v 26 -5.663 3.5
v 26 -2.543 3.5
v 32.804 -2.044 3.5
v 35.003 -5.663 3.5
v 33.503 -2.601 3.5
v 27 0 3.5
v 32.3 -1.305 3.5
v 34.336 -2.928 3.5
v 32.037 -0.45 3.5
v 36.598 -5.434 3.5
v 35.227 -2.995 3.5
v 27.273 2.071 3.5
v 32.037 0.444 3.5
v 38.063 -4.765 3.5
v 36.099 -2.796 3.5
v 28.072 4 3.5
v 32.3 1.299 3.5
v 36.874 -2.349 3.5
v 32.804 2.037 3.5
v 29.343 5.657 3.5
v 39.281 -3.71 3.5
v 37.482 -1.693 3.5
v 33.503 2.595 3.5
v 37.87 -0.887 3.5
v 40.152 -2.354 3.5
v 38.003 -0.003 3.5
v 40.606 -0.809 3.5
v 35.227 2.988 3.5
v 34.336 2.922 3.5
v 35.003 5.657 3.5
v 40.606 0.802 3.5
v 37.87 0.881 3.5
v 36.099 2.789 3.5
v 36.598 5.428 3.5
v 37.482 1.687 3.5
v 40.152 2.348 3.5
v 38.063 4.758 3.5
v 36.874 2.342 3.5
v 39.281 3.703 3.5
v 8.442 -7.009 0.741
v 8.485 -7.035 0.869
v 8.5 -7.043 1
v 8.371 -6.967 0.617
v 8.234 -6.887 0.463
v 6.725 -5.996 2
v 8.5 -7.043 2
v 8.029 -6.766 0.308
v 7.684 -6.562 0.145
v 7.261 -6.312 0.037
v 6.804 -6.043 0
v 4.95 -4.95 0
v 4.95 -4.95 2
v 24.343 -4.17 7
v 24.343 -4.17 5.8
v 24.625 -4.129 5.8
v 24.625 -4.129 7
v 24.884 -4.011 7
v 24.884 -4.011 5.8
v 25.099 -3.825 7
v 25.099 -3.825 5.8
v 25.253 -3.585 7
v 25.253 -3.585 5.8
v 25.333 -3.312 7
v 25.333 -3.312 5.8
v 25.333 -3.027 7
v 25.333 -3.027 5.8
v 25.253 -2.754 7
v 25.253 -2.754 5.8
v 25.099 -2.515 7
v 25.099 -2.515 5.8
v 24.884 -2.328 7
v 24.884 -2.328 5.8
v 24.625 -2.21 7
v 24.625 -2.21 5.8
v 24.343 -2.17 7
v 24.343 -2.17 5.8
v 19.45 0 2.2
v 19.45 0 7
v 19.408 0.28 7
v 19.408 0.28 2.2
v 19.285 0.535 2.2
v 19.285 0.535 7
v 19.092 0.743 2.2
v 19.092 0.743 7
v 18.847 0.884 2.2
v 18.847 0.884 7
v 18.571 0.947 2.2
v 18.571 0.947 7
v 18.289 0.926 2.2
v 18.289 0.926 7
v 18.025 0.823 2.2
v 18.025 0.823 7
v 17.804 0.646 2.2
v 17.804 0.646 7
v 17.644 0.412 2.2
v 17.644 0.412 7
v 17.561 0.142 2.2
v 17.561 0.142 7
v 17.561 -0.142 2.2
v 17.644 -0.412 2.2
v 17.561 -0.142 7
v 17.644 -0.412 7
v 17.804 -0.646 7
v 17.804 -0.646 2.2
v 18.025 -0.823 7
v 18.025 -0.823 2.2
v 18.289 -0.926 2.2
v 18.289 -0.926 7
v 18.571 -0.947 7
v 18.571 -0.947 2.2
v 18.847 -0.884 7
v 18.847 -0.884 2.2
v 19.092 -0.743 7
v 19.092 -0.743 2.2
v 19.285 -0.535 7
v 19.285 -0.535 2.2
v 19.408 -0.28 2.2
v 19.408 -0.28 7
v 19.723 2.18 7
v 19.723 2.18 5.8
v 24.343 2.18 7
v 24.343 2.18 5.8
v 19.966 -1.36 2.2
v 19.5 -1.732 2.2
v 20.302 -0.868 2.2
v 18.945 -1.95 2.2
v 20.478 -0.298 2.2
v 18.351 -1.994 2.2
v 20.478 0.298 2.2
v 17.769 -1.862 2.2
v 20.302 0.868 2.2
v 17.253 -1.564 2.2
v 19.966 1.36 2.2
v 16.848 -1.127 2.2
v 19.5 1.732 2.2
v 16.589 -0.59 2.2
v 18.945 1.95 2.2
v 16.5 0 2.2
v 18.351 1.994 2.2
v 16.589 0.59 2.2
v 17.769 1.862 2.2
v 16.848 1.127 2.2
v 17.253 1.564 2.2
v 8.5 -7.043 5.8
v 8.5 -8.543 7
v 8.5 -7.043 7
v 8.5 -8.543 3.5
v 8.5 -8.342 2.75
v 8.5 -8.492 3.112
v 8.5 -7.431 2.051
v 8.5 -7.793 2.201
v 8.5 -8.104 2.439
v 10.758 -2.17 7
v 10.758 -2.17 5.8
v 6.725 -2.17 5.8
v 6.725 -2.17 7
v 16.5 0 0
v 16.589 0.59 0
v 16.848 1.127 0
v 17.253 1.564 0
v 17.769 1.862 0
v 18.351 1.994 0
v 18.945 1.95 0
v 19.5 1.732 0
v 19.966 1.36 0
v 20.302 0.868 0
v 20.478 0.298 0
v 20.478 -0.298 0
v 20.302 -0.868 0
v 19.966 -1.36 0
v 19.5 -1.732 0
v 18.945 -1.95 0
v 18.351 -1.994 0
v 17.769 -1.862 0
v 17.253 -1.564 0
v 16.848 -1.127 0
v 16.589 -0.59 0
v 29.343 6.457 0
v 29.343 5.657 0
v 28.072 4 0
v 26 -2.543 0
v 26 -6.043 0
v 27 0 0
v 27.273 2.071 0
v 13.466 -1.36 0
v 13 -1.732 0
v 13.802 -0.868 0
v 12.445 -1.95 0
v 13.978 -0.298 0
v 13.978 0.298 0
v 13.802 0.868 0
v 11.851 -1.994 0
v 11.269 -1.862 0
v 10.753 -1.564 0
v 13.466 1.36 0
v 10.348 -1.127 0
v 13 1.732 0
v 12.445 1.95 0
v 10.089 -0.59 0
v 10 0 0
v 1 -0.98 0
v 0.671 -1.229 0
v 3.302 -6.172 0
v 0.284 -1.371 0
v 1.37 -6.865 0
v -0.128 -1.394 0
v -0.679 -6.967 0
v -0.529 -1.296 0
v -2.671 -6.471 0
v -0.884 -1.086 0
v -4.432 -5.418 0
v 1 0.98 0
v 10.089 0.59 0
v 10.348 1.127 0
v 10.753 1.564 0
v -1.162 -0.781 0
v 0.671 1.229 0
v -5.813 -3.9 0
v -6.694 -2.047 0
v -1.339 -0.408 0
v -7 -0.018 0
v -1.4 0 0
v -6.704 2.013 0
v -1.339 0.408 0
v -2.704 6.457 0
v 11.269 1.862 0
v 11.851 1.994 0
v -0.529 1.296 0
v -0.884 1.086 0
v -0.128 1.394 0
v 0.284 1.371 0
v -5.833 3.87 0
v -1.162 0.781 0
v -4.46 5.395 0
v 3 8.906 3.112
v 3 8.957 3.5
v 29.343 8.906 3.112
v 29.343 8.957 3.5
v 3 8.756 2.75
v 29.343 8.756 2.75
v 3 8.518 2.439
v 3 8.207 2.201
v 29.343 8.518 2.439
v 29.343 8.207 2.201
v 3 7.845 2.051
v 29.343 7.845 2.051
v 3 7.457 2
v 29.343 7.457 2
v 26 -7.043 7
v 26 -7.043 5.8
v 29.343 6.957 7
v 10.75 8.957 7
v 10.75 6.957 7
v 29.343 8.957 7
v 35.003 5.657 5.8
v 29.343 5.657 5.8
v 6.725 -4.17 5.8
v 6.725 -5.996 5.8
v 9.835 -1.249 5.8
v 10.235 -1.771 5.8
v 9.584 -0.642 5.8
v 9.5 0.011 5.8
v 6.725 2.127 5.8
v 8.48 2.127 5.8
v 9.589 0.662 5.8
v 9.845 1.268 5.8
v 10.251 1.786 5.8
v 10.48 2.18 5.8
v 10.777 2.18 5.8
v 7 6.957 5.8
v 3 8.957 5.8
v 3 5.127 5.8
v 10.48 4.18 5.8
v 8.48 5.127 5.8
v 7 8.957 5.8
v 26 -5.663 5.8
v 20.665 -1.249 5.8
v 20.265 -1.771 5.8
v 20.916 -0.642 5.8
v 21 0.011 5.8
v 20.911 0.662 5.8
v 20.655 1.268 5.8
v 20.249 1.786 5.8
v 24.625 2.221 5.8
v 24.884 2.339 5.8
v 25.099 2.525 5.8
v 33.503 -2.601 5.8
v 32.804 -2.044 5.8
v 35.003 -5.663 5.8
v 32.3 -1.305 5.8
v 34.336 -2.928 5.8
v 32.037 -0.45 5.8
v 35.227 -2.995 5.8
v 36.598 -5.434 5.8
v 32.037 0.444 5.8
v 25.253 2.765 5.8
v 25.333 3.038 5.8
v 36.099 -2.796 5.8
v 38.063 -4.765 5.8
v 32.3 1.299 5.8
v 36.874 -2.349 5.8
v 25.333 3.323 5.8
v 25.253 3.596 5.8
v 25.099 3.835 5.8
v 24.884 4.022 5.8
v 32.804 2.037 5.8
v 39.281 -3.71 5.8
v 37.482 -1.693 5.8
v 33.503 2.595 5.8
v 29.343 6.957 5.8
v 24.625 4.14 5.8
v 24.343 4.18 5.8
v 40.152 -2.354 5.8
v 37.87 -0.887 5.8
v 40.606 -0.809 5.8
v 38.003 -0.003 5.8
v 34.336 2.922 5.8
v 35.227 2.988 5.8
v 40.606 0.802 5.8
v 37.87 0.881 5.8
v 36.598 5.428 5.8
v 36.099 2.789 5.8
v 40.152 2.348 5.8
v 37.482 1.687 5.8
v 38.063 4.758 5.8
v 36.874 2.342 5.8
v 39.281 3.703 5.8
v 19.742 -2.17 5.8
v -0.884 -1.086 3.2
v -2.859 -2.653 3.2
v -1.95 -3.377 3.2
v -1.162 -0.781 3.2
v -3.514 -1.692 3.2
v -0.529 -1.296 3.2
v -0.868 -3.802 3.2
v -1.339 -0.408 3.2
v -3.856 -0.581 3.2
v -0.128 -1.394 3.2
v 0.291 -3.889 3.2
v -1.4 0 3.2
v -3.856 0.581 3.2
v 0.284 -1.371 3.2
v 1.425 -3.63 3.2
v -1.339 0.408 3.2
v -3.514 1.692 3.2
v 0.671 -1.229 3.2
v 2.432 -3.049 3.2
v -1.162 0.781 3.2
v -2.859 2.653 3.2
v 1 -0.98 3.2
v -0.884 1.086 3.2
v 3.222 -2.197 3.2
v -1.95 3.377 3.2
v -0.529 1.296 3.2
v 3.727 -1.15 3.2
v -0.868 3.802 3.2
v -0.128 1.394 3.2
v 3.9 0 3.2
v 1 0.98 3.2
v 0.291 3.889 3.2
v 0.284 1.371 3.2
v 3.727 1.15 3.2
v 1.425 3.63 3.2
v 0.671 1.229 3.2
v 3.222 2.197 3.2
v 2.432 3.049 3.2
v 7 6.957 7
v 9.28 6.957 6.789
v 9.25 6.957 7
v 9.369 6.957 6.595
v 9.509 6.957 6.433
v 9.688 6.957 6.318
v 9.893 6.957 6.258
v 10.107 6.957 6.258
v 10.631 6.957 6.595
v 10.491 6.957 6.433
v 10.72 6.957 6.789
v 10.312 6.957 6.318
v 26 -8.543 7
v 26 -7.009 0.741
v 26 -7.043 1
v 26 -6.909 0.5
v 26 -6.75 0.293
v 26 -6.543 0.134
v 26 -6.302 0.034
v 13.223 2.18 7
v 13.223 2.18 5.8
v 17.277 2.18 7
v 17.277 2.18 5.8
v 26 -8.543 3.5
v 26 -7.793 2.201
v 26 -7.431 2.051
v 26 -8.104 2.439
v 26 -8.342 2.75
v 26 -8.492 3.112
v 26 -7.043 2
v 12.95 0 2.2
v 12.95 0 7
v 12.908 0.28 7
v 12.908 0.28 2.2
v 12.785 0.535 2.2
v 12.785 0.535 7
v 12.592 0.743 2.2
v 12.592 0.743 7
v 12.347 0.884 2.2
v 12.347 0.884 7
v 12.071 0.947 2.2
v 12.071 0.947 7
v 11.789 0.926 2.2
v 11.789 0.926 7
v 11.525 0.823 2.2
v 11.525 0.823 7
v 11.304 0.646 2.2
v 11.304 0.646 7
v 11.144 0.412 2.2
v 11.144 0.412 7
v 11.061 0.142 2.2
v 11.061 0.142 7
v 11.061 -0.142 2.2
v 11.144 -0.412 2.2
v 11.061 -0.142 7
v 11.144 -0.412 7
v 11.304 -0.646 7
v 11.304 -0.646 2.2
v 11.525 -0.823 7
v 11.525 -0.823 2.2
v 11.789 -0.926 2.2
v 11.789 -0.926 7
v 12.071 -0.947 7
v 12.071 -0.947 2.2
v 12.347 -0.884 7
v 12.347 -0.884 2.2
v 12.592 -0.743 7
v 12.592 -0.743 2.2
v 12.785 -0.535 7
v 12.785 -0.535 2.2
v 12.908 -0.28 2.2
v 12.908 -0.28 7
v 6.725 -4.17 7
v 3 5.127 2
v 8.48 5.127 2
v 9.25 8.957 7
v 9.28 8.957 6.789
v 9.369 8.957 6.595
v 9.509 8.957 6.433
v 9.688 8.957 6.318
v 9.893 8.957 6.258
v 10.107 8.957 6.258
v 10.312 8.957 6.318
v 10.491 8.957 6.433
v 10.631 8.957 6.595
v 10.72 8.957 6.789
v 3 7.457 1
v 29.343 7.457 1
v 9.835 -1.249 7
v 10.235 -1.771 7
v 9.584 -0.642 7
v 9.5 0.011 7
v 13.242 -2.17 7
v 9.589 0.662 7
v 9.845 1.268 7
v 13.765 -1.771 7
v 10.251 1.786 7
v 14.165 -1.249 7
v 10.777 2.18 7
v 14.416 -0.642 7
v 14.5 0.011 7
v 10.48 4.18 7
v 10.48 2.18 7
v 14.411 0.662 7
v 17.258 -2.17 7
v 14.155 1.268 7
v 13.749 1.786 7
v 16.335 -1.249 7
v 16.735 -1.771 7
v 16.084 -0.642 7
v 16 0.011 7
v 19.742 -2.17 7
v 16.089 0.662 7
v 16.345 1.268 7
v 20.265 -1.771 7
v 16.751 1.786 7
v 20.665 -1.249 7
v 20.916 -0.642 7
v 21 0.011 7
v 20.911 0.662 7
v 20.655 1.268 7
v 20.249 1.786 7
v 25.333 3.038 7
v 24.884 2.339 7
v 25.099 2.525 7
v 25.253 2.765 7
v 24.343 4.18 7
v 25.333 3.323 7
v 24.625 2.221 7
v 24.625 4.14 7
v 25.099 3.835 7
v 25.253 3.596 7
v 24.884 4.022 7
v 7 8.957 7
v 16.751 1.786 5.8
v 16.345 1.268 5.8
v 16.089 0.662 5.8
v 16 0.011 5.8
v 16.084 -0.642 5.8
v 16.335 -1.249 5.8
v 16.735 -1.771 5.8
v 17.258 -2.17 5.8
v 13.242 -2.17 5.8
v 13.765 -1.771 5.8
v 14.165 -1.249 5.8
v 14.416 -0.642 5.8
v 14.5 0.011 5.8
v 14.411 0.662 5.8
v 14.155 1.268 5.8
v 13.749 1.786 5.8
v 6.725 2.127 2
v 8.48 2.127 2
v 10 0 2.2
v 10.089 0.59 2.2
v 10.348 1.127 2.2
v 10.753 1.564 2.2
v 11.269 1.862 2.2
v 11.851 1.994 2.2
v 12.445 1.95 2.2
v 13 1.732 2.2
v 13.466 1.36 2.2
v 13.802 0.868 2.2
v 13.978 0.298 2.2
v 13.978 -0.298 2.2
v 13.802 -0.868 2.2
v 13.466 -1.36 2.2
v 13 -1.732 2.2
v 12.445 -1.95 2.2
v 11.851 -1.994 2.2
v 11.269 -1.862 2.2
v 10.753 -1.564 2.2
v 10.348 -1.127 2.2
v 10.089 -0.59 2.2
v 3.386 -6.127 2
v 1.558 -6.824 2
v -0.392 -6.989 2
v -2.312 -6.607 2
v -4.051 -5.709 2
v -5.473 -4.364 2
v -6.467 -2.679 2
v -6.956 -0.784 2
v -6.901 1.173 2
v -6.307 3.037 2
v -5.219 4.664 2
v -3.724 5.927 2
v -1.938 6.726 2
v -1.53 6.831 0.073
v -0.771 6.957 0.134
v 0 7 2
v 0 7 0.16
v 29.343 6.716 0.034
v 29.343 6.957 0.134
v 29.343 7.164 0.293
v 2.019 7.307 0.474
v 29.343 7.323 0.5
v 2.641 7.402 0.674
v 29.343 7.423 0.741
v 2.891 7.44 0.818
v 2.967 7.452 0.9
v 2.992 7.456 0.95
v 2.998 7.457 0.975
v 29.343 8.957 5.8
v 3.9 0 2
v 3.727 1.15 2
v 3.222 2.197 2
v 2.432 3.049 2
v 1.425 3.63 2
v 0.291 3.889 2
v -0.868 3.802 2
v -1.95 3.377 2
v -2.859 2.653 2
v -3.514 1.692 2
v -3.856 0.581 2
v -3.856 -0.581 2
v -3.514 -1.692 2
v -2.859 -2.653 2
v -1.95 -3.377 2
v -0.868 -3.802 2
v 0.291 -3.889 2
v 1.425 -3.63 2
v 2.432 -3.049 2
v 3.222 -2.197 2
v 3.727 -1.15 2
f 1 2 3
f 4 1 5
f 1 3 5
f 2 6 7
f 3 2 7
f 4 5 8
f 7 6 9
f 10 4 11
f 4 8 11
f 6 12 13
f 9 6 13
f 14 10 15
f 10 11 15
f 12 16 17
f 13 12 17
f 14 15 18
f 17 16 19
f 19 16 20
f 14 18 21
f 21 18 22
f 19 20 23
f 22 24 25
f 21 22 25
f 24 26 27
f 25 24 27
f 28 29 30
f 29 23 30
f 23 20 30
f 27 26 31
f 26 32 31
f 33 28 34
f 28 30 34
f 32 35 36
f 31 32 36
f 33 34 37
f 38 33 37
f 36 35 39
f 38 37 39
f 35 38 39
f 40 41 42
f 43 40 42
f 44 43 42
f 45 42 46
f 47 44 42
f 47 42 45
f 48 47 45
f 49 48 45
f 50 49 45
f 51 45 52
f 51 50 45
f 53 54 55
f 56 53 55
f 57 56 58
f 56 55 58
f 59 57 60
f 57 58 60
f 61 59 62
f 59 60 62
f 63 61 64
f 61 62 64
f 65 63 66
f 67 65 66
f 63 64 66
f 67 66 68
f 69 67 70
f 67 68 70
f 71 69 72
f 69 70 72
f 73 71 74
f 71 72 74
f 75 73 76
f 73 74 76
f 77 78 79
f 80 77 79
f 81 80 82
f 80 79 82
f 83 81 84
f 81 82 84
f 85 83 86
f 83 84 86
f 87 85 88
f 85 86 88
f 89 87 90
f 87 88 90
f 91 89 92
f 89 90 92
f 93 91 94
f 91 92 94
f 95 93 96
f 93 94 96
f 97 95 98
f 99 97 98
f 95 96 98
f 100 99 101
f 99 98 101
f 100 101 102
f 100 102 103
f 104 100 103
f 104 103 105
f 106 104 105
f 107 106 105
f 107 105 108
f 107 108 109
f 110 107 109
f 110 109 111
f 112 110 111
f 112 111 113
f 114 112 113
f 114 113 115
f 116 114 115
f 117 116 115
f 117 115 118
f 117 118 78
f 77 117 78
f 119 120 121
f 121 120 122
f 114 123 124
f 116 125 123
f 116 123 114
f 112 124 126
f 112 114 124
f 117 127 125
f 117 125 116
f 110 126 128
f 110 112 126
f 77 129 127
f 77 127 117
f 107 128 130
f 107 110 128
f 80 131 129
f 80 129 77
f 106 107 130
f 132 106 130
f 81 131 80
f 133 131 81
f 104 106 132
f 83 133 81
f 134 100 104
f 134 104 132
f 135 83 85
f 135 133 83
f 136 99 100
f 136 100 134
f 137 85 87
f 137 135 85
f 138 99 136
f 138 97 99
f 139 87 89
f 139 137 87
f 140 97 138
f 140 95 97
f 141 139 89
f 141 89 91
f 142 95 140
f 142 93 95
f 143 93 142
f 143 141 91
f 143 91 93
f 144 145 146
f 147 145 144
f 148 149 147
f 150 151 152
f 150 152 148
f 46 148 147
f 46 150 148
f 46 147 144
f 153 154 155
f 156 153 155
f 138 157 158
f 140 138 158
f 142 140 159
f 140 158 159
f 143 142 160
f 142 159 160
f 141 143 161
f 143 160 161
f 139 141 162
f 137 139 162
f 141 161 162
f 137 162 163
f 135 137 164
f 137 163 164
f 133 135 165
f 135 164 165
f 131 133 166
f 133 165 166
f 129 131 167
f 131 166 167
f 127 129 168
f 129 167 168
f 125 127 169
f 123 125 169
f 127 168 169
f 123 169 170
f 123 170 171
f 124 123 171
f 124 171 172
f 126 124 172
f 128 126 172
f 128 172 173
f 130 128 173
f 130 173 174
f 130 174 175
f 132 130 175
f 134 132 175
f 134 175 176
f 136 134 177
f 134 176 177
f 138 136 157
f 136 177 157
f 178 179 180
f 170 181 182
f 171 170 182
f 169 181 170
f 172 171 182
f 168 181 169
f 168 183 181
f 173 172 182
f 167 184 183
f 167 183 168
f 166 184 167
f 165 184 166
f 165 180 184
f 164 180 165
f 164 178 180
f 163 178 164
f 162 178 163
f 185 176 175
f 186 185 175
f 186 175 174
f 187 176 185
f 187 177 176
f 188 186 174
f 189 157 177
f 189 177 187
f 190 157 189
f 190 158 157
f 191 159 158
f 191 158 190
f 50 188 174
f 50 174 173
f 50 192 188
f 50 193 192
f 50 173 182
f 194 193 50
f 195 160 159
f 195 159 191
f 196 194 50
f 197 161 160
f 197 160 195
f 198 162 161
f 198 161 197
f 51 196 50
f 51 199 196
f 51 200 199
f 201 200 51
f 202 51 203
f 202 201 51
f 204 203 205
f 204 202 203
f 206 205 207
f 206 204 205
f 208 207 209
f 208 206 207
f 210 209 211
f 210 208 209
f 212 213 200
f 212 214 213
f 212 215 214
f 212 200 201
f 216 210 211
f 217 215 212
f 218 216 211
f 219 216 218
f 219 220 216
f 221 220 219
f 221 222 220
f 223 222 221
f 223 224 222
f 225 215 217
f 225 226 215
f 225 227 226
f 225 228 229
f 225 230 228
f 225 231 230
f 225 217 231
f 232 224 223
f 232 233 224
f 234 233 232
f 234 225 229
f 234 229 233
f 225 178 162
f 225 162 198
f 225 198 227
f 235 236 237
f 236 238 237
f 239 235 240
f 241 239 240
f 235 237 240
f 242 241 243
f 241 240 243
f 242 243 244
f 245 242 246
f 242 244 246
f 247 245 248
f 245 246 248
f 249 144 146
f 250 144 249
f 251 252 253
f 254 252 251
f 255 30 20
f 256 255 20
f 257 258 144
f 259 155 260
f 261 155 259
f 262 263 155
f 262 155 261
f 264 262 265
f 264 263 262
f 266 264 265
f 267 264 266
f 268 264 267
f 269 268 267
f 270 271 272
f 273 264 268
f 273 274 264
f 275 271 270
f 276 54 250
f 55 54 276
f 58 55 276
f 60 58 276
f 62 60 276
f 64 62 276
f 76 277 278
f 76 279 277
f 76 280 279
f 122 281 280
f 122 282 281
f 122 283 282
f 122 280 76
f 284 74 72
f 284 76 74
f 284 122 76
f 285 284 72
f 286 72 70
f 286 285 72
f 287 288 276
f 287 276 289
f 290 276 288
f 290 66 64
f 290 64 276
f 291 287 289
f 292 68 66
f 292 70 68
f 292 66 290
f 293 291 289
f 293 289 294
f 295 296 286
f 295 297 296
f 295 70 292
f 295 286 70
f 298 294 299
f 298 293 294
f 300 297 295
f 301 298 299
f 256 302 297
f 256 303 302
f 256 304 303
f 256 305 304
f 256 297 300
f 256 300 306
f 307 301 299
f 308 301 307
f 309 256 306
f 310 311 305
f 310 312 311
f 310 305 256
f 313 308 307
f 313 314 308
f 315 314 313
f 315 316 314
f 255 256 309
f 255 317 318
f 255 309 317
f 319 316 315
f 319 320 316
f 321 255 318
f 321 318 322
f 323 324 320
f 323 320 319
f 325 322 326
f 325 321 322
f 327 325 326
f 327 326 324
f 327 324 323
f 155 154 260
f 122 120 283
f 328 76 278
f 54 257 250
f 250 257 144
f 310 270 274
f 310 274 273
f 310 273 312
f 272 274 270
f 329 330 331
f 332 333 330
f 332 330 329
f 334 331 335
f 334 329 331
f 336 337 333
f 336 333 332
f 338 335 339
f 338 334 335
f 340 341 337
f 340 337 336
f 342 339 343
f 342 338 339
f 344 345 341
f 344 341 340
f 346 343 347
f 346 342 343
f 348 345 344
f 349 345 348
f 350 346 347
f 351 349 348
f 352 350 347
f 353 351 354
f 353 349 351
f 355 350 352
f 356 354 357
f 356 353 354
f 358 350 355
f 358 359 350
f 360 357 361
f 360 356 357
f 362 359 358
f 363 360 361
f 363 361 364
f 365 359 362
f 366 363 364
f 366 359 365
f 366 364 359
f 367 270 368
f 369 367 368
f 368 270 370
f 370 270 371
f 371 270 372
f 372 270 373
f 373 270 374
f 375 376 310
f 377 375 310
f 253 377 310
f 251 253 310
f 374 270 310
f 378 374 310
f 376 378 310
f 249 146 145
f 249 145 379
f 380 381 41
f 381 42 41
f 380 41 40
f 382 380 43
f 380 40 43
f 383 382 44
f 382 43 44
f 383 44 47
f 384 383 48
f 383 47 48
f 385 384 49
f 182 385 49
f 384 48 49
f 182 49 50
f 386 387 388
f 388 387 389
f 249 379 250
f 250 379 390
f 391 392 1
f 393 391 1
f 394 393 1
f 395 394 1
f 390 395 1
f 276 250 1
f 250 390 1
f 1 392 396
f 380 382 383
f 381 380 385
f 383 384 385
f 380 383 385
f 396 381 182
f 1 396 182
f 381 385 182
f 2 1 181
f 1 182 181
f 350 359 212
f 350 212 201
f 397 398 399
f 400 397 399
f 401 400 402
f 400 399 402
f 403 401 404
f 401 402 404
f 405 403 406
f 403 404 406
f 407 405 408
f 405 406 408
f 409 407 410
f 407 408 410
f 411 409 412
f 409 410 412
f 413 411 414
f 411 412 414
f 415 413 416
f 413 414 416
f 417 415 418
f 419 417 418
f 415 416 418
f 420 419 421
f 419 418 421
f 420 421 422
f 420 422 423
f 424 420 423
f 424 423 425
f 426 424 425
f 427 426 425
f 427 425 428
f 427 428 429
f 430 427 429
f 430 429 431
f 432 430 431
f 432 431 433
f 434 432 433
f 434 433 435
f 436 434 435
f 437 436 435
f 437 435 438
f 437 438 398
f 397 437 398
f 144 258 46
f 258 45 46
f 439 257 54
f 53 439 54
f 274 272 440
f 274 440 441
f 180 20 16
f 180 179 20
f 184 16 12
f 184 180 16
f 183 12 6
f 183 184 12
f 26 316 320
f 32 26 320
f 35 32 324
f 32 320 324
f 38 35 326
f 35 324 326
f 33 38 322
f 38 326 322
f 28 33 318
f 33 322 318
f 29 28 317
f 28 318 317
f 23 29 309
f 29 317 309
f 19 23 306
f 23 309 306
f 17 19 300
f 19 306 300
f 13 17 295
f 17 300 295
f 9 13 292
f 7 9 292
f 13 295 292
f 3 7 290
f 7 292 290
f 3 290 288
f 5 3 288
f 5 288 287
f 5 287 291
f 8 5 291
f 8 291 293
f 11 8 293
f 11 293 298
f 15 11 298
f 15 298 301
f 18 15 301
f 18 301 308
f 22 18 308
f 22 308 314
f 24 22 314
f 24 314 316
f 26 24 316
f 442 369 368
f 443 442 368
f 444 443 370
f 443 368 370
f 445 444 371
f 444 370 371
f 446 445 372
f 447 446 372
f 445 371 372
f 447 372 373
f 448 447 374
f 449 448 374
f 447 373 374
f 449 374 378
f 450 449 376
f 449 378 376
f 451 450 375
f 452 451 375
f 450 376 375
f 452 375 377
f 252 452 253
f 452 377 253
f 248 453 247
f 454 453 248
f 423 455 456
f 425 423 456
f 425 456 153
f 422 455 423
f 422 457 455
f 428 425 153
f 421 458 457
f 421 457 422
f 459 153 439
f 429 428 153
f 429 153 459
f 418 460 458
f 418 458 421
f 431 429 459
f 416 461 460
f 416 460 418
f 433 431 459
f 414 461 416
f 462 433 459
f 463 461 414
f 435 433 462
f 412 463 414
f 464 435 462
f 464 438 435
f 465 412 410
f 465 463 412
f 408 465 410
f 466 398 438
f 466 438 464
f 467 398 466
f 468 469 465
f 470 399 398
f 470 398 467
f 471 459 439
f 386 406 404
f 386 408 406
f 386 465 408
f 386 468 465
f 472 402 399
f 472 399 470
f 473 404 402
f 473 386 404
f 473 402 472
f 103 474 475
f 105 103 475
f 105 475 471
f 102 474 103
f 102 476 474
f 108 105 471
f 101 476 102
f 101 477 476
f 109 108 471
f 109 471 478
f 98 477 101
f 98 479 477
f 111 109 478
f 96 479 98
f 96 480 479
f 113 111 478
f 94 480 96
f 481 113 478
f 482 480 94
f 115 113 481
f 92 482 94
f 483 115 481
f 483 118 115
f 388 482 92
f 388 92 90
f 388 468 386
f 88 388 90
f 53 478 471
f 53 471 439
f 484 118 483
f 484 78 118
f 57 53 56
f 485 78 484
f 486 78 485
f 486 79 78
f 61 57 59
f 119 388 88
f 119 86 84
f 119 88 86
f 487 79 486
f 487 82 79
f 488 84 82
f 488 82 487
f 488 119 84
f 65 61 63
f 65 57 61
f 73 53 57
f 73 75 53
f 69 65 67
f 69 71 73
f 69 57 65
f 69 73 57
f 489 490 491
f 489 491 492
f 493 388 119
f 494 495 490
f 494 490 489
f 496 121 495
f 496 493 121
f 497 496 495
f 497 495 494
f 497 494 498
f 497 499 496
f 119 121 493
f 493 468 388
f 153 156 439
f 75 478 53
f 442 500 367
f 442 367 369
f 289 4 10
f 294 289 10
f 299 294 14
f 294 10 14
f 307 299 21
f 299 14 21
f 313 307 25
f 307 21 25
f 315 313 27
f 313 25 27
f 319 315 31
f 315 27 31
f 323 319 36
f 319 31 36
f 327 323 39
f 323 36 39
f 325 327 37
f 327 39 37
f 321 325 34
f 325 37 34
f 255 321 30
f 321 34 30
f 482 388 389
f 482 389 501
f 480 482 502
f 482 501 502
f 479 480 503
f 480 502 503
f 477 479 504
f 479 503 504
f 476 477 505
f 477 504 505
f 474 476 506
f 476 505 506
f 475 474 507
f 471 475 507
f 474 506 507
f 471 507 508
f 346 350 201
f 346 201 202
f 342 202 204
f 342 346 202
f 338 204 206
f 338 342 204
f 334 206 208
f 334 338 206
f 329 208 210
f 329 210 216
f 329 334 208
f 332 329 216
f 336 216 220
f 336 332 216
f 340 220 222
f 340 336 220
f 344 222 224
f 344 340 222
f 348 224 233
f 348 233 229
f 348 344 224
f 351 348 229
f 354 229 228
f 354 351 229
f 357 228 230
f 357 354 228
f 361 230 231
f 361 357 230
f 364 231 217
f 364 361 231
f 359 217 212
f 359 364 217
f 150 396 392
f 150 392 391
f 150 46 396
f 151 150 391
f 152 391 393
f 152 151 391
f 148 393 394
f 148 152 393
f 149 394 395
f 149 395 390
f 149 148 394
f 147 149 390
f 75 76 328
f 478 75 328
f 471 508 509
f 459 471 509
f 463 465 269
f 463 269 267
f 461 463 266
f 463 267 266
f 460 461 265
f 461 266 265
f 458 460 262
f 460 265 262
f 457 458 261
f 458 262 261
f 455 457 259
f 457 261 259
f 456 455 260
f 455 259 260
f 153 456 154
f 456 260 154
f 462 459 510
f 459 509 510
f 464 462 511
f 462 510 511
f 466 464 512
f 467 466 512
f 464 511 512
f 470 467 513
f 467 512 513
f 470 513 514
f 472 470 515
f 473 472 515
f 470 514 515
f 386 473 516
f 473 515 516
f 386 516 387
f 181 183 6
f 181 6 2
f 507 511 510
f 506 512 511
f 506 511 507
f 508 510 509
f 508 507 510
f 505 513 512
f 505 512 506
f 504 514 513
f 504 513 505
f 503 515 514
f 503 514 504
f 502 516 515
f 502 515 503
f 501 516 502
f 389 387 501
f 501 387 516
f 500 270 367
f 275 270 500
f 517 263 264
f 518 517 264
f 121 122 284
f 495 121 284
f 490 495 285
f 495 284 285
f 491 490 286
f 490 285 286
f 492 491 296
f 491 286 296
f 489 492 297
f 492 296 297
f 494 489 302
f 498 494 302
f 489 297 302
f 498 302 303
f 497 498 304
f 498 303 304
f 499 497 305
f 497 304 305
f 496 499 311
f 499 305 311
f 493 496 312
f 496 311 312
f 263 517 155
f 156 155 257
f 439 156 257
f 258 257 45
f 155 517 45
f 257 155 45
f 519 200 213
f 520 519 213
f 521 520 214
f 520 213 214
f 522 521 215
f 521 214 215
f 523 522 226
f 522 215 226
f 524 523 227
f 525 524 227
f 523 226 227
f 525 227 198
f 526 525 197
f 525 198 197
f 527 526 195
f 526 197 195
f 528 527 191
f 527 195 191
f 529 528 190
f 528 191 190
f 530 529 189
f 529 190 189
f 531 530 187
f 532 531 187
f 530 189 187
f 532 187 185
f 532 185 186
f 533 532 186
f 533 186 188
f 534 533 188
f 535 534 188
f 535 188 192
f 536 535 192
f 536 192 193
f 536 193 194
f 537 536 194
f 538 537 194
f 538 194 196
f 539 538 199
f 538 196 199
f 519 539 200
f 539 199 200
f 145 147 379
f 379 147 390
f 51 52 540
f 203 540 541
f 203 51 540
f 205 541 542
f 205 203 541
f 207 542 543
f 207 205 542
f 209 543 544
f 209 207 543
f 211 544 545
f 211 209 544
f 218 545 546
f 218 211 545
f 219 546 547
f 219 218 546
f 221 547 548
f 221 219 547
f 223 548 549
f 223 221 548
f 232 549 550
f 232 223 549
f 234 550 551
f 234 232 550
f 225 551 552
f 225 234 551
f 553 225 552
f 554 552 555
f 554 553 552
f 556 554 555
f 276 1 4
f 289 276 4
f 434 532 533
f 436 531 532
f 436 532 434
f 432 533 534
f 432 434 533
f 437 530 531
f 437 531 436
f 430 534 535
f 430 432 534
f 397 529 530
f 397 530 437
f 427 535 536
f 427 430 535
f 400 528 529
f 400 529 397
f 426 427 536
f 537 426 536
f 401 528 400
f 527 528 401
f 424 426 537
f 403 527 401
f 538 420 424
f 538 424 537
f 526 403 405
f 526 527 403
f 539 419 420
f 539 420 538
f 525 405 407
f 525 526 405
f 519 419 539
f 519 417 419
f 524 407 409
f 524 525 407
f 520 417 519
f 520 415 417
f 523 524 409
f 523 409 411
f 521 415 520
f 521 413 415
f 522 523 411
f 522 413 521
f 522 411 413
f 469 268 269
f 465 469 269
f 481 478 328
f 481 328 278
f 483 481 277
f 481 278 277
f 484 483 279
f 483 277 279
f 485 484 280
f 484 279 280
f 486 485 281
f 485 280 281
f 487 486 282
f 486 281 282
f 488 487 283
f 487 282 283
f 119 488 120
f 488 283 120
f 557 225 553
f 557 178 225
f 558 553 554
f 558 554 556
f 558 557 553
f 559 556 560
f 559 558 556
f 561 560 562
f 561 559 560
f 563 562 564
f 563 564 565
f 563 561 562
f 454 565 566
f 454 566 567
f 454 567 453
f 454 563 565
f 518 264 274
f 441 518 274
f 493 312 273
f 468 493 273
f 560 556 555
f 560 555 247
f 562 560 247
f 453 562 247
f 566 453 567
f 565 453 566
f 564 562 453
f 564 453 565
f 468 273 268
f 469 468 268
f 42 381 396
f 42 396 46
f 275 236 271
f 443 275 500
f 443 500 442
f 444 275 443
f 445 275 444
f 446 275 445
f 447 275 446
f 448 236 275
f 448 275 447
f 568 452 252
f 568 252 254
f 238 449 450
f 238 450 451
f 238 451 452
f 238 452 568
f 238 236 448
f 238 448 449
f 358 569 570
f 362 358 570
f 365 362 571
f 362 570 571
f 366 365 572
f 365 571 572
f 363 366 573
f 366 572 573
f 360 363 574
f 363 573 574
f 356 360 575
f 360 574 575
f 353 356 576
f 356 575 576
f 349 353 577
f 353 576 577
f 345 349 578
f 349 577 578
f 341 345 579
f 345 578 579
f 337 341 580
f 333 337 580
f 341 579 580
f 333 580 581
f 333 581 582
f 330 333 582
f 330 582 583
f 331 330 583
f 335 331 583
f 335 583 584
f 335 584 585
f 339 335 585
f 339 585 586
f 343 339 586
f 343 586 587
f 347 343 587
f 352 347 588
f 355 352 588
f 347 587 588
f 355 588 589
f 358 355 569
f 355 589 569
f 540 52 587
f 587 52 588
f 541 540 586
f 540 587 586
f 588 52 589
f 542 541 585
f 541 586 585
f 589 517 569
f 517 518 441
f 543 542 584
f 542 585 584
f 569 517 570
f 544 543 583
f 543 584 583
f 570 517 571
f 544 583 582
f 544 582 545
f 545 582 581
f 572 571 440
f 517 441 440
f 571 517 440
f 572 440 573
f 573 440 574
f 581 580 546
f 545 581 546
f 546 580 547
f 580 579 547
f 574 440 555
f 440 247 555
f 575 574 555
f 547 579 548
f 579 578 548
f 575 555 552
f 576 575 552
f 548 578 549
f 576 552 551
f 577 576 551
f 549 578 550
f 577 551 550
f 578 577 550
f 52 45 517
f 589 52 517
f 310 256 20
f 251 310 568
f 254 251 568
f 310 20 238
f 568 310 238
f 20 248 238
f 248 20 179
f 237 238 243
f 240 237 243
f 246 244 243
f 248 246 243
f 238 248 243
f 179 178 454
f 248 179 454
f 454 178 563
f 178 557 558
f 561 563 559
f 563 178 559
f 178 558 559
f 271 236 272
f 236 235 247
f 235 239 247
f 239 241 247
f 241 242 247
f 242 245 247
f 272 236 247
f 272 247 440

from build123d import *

# Parameters (mm, degrees)
BOSS_EXTRUDE1_DEPTH = 2
BOSS_EXTRUDE2_DEPTH = 1.5
BOSS_EXTRUDE3_DEPTH = 2.3
SKETCH6_W           = 5.48
SKETCH6_H           = 3
CUT_EXTRUDE1_DEPTH  = 3.8
SKETCH7_R           = 3
CUT_EXTRUDE2_DEPTH  = 3.3
SKETCH8_W           = 22.343145751
SKETCH8_H           = 2
SKETCH8_W_2         = 17.500252532
SKETCH8_H_2         = 1.5
BOSS_EXTRUDE4_DEPTH = 1.2
SKETCH9_R           = 2.5
BOSS_EXTRUDE5_DEPTH = 1.2
SKETCH10_R          = 0.95
CUT_EXTRUDE3_DEPTH  = 8.2
SKETCH11_R          = 2
CUT_EXTRUDE4_DEPTH  = 2.2
SKETCH12_R          = 3.9
BOSS_EXTRUDE6_DEPTH = 1.2
CUT_EXTRUDE5_DEPTH  = 3.2
FILLET1_R           = 1.5
FILLET2_R           = 1
SKETCH15_R          = 0.75
CUT_EXTRUDE6_DEPTH  = 10


with BuildPart() as part:
    # Sketch2 → Boss-Extrude1 (new body)
    with BuildSketch(Plane.XY):
        with BuildLine():
            Line((0, 7), (3, 7.456854249))
            Line((3, 7.456854249), (29.343145751, 7.456854249))
            Line((29.343145751, 7.456854249), (29.343145751, 5.656854249))
            ThreePointArc((29.343145751, 5.656854249), (27.60896374, 3.061467459), (27, 0))
            Line((27, 0), (26, -2.543145751))
            Line((26, -2.543145751), (26, -7.043145751))
            Line((26, -7.043145751), (8.499747468, -7.043145751))
            Line((8.499747468, -7.043145751), (4.949747468, -4.949747468))
            ThreePointArc((4.949747468, -4.949747468), (-6.467156728, -2.678784027), (0, 7))
        make_face()
    extrude(amount=BOSS_EXTRUDE1_DEPTH)

    # Sketch3 → Boss-Extrude2 (add)
    with BuildSketch(Plane.XY.offset(2)):
        with BuildLine():
            Line((29.343145751, 7.456854249), (29.343145751, 5.656854249))
            ThreePointArc((29.343145751, 5.656854249), (27.60896374, 3.061467459), (27, 0))
            Line((27, 0), (26, -2.543145751))
            Line((26, -2.543145751), (26, -7.043145751))
            Line((26, -7.043145751), (26, -8.543145751))
            Line((26, -8.543145751), (8.499747468, -8.543145751))
            Line((8.499747468, -8.543145751), (8.499747468, -7.043145751))
            Line((8.499747468, -7.043145751), (6.724747468, -5.996446609))
            Line((6.724747468, -5.996446609), (6.724747468, 2.126854249))
            Line((6.724747468, 2.126854249), (3, 2.126854249))
            Line((3, 2.126854249), (3, 7.456854249))
            Line((3, 7.456854249), (3, 8.956854249))
            Line((3, 8.956854249), (29.343145751, 8.956854249))
            Line((29.343145751, 8.956854249), (29.343145751, 7.456854249))
        make_face()
    extrude(amount=BOSS_EXTRUDE2_DEPTH)

    # Sketch5 → Boss-Extrude3 (add)
    with BuildSketch(Plane.XY.offset(3.5)):
        with BuildLine():
            Line((3, 7.5), (3, 2.126854249))
            Line((3, 2.126854249), (6.724747468, 2.126854249))
            Line((6.724747468, 2.126854249), (6.724747468, -5.996446609))
            Line((6.724747468, -5.996446609), (8.499747468, -7.043145751))
            Line((8.499747468, -7.043145751), (8.499747468, -8.543145751))
            Line((8.499747468, -8.543145751), (26, -8.543145751))
            Line((26, -8.543145751), (26, -5.663145751))
            Line((26, -5.663145751), (35.003145751, -5.663145751))
            ThreePointArc((35.003145751, -5.663145751), (40.663145751, -0.003145751), (35.003145751, 5.656854249))
            Line((35.003145751, 5.656854249), (29.343145751, 5.656854249))
            Line((29.343145751, 5.656854249), (29.343145751, 7.5))
            Line((29.343145751, 7.5), (29.343145751, 8.956854249))
            Line((29.343145751, 8.956854249), (3, 8.956854249))
            Line((3, 8.956854249), (3, 7.5))
        make_face()
    extrude(amount=BOSS_EXTRUDE3_DEPTH)

    # Sketch6 → Cut-Extrude1 (cut)
    with BuildSketch(Plane.XY.offset(5.8)):
        with Locations((5.74, 3.626854249)):
            Rectangle(SKETCH6_W, SKETCH6_H)
    extrude(amount=-CUT_EXTRUDE1_DEPTH, mode=Mode.SUBTRACT)

    # Sketch7 → Cut-Extrude2 (cut)
    with BuildSketch(Plane.XY.offset(5.8)):
        with Locations((35.003145751, -0.003145751)):
            Circle(SKETCH7_R)
    extrude(amount=-CUT_EXTRUDE2_DEPTH, mode=Mode.SUBTRACT)

    # Sketch8 → Boss-Extrude4 (add)
    with BuildSketch(Plane.XY.offset(5.8)):
        with Locations((18.171572876, 7.956854249)):
            Rectangle(SKETCH8_W, SKETCH8_H)
        with Locations((17.249873734, -7.793145751)):
            Rectangle(SKETCH8_W_2, SKETCH8_H_2)
        with BuildLine():
            Line((6.724747468, -4.169704782), (24.343145751, -4.169704782))
            ThreePointArc((24.343145751, -4.169704782), (25.343145751, -3.169704782), (24.343145751, -2.169704782))
            Line((24.343145751, -2.169704782), (6.724747468, -2.169704782))
            Line((6.724747468, -2.169704782), (6.724747468, -4.169704782))
        make_face()
        with BuildLine():
            Line((24.343145751, 4.180295218), (10.48, 4.180295218))
            Line((10.48, 4.180295218), (10.48, 2.180295218))
            Line((10.48, 2.180295218), (24.343145751, 2.180295218))
            ThreePointArc((24.343145751, 2.180295218), (25.343145751, 3.180295218), (24.343145751, 4.180295218))
        make_face()
    extrude(amount=BOSS_EXTRUDE4_DEPTH)

    # Sketch9 → Boss-Extrude5 (add)
    with BuildSketch(Plane.XY.offset(5.8)):
        with Locations((18.5, 0)):
            Circle(SKETCH9_R)
        with Locations((12, 0)):
            Circle(SKETCH9_R)
    extrude(amount=BOSS_EXTRUDE5_DEPTH)

    # Sketch10 → Cut-Extrude3 (cut)
    with BuildSketch(Plane.XY.offset(7)):
        with Locations((18.5, 0)):
            Circle(SKETCH10_R)
        with Locations((12, 0)):
            Circle(SKETCH10_R)
    extrude(amount=-CUT_EXTRUDE3_DEPTH, mode=Mode.SUBTRACT)

    # Sketch11 → Cut-Extrude4 (cut)
    with BuildSketch(Plane(origin=(0, 0, 0), x_dir=(-1, 0, 0), z_dir=(0, 0, -1))):
        with Locations((-12, 0)):
            Circle(SKETCH11_R)
        with Locations((-18.5, 0)):
            Circle(SKETCH11_R)
    extrude(amount=-CUT_EXTRUDE4_DEPTH, mode=Mode.SUBTRACT)

    # Sketch12 → Boss-Extrude6 (add)
    with BuildSketch(Plane.XY.offset(2)):
        Circle(SKETCH12_R)
    extrude(amount=BOSS_EXTRUDE6_DEPTH)

    # Sketch14 → Cut-Extrude5 (cut)
    with BuildSketch(Plane.XY.offset(3.2)):
        with BuildLine():
            Line((1, 0.979795897), (1, -0.979795897))
            ThreePointArc((1, -0.979795897), (-1.4, 0), (1, 0.979795897))
        make_face()
    extrude(amount=-CUT_EXTRUDE5_DEPTH, mode=Mode.SUBTRACT)

    # Fillet1
    fillet1_edges = [part.edges().sort_by_distance(p)[0] for p in [
        (16.171572875, 8.956854249, 2),
        (17.249873734, -8.543145751, 2),
    ]]
    fillet(fillet1_edges, radius=FILLET1_R - 0.0001)  # a hair under: the kernel refuses the full size

    # Fillet2
    fillet2_edges = [part.edges().sort_by_distance(p)[0] for p in [
        (17.249873734, -7.043145751, 0),
        (16.171572875, 7.456854249, 0),
    ]]
    fillet(fillet2_edges, radius=FILLET2_R)

    # Sketch15 → Cut-Extrude6 (cut)
    with BuildSketch(Plane.XZ.offset(-6.956854249)):
        with Locations((10, 7)):
            Circle(SKETCH15_R)
    extrude(amount=-CUT_EXTRUDE6_DEPTH, mode=Mode.SUBTRACT)


solid = part.part
